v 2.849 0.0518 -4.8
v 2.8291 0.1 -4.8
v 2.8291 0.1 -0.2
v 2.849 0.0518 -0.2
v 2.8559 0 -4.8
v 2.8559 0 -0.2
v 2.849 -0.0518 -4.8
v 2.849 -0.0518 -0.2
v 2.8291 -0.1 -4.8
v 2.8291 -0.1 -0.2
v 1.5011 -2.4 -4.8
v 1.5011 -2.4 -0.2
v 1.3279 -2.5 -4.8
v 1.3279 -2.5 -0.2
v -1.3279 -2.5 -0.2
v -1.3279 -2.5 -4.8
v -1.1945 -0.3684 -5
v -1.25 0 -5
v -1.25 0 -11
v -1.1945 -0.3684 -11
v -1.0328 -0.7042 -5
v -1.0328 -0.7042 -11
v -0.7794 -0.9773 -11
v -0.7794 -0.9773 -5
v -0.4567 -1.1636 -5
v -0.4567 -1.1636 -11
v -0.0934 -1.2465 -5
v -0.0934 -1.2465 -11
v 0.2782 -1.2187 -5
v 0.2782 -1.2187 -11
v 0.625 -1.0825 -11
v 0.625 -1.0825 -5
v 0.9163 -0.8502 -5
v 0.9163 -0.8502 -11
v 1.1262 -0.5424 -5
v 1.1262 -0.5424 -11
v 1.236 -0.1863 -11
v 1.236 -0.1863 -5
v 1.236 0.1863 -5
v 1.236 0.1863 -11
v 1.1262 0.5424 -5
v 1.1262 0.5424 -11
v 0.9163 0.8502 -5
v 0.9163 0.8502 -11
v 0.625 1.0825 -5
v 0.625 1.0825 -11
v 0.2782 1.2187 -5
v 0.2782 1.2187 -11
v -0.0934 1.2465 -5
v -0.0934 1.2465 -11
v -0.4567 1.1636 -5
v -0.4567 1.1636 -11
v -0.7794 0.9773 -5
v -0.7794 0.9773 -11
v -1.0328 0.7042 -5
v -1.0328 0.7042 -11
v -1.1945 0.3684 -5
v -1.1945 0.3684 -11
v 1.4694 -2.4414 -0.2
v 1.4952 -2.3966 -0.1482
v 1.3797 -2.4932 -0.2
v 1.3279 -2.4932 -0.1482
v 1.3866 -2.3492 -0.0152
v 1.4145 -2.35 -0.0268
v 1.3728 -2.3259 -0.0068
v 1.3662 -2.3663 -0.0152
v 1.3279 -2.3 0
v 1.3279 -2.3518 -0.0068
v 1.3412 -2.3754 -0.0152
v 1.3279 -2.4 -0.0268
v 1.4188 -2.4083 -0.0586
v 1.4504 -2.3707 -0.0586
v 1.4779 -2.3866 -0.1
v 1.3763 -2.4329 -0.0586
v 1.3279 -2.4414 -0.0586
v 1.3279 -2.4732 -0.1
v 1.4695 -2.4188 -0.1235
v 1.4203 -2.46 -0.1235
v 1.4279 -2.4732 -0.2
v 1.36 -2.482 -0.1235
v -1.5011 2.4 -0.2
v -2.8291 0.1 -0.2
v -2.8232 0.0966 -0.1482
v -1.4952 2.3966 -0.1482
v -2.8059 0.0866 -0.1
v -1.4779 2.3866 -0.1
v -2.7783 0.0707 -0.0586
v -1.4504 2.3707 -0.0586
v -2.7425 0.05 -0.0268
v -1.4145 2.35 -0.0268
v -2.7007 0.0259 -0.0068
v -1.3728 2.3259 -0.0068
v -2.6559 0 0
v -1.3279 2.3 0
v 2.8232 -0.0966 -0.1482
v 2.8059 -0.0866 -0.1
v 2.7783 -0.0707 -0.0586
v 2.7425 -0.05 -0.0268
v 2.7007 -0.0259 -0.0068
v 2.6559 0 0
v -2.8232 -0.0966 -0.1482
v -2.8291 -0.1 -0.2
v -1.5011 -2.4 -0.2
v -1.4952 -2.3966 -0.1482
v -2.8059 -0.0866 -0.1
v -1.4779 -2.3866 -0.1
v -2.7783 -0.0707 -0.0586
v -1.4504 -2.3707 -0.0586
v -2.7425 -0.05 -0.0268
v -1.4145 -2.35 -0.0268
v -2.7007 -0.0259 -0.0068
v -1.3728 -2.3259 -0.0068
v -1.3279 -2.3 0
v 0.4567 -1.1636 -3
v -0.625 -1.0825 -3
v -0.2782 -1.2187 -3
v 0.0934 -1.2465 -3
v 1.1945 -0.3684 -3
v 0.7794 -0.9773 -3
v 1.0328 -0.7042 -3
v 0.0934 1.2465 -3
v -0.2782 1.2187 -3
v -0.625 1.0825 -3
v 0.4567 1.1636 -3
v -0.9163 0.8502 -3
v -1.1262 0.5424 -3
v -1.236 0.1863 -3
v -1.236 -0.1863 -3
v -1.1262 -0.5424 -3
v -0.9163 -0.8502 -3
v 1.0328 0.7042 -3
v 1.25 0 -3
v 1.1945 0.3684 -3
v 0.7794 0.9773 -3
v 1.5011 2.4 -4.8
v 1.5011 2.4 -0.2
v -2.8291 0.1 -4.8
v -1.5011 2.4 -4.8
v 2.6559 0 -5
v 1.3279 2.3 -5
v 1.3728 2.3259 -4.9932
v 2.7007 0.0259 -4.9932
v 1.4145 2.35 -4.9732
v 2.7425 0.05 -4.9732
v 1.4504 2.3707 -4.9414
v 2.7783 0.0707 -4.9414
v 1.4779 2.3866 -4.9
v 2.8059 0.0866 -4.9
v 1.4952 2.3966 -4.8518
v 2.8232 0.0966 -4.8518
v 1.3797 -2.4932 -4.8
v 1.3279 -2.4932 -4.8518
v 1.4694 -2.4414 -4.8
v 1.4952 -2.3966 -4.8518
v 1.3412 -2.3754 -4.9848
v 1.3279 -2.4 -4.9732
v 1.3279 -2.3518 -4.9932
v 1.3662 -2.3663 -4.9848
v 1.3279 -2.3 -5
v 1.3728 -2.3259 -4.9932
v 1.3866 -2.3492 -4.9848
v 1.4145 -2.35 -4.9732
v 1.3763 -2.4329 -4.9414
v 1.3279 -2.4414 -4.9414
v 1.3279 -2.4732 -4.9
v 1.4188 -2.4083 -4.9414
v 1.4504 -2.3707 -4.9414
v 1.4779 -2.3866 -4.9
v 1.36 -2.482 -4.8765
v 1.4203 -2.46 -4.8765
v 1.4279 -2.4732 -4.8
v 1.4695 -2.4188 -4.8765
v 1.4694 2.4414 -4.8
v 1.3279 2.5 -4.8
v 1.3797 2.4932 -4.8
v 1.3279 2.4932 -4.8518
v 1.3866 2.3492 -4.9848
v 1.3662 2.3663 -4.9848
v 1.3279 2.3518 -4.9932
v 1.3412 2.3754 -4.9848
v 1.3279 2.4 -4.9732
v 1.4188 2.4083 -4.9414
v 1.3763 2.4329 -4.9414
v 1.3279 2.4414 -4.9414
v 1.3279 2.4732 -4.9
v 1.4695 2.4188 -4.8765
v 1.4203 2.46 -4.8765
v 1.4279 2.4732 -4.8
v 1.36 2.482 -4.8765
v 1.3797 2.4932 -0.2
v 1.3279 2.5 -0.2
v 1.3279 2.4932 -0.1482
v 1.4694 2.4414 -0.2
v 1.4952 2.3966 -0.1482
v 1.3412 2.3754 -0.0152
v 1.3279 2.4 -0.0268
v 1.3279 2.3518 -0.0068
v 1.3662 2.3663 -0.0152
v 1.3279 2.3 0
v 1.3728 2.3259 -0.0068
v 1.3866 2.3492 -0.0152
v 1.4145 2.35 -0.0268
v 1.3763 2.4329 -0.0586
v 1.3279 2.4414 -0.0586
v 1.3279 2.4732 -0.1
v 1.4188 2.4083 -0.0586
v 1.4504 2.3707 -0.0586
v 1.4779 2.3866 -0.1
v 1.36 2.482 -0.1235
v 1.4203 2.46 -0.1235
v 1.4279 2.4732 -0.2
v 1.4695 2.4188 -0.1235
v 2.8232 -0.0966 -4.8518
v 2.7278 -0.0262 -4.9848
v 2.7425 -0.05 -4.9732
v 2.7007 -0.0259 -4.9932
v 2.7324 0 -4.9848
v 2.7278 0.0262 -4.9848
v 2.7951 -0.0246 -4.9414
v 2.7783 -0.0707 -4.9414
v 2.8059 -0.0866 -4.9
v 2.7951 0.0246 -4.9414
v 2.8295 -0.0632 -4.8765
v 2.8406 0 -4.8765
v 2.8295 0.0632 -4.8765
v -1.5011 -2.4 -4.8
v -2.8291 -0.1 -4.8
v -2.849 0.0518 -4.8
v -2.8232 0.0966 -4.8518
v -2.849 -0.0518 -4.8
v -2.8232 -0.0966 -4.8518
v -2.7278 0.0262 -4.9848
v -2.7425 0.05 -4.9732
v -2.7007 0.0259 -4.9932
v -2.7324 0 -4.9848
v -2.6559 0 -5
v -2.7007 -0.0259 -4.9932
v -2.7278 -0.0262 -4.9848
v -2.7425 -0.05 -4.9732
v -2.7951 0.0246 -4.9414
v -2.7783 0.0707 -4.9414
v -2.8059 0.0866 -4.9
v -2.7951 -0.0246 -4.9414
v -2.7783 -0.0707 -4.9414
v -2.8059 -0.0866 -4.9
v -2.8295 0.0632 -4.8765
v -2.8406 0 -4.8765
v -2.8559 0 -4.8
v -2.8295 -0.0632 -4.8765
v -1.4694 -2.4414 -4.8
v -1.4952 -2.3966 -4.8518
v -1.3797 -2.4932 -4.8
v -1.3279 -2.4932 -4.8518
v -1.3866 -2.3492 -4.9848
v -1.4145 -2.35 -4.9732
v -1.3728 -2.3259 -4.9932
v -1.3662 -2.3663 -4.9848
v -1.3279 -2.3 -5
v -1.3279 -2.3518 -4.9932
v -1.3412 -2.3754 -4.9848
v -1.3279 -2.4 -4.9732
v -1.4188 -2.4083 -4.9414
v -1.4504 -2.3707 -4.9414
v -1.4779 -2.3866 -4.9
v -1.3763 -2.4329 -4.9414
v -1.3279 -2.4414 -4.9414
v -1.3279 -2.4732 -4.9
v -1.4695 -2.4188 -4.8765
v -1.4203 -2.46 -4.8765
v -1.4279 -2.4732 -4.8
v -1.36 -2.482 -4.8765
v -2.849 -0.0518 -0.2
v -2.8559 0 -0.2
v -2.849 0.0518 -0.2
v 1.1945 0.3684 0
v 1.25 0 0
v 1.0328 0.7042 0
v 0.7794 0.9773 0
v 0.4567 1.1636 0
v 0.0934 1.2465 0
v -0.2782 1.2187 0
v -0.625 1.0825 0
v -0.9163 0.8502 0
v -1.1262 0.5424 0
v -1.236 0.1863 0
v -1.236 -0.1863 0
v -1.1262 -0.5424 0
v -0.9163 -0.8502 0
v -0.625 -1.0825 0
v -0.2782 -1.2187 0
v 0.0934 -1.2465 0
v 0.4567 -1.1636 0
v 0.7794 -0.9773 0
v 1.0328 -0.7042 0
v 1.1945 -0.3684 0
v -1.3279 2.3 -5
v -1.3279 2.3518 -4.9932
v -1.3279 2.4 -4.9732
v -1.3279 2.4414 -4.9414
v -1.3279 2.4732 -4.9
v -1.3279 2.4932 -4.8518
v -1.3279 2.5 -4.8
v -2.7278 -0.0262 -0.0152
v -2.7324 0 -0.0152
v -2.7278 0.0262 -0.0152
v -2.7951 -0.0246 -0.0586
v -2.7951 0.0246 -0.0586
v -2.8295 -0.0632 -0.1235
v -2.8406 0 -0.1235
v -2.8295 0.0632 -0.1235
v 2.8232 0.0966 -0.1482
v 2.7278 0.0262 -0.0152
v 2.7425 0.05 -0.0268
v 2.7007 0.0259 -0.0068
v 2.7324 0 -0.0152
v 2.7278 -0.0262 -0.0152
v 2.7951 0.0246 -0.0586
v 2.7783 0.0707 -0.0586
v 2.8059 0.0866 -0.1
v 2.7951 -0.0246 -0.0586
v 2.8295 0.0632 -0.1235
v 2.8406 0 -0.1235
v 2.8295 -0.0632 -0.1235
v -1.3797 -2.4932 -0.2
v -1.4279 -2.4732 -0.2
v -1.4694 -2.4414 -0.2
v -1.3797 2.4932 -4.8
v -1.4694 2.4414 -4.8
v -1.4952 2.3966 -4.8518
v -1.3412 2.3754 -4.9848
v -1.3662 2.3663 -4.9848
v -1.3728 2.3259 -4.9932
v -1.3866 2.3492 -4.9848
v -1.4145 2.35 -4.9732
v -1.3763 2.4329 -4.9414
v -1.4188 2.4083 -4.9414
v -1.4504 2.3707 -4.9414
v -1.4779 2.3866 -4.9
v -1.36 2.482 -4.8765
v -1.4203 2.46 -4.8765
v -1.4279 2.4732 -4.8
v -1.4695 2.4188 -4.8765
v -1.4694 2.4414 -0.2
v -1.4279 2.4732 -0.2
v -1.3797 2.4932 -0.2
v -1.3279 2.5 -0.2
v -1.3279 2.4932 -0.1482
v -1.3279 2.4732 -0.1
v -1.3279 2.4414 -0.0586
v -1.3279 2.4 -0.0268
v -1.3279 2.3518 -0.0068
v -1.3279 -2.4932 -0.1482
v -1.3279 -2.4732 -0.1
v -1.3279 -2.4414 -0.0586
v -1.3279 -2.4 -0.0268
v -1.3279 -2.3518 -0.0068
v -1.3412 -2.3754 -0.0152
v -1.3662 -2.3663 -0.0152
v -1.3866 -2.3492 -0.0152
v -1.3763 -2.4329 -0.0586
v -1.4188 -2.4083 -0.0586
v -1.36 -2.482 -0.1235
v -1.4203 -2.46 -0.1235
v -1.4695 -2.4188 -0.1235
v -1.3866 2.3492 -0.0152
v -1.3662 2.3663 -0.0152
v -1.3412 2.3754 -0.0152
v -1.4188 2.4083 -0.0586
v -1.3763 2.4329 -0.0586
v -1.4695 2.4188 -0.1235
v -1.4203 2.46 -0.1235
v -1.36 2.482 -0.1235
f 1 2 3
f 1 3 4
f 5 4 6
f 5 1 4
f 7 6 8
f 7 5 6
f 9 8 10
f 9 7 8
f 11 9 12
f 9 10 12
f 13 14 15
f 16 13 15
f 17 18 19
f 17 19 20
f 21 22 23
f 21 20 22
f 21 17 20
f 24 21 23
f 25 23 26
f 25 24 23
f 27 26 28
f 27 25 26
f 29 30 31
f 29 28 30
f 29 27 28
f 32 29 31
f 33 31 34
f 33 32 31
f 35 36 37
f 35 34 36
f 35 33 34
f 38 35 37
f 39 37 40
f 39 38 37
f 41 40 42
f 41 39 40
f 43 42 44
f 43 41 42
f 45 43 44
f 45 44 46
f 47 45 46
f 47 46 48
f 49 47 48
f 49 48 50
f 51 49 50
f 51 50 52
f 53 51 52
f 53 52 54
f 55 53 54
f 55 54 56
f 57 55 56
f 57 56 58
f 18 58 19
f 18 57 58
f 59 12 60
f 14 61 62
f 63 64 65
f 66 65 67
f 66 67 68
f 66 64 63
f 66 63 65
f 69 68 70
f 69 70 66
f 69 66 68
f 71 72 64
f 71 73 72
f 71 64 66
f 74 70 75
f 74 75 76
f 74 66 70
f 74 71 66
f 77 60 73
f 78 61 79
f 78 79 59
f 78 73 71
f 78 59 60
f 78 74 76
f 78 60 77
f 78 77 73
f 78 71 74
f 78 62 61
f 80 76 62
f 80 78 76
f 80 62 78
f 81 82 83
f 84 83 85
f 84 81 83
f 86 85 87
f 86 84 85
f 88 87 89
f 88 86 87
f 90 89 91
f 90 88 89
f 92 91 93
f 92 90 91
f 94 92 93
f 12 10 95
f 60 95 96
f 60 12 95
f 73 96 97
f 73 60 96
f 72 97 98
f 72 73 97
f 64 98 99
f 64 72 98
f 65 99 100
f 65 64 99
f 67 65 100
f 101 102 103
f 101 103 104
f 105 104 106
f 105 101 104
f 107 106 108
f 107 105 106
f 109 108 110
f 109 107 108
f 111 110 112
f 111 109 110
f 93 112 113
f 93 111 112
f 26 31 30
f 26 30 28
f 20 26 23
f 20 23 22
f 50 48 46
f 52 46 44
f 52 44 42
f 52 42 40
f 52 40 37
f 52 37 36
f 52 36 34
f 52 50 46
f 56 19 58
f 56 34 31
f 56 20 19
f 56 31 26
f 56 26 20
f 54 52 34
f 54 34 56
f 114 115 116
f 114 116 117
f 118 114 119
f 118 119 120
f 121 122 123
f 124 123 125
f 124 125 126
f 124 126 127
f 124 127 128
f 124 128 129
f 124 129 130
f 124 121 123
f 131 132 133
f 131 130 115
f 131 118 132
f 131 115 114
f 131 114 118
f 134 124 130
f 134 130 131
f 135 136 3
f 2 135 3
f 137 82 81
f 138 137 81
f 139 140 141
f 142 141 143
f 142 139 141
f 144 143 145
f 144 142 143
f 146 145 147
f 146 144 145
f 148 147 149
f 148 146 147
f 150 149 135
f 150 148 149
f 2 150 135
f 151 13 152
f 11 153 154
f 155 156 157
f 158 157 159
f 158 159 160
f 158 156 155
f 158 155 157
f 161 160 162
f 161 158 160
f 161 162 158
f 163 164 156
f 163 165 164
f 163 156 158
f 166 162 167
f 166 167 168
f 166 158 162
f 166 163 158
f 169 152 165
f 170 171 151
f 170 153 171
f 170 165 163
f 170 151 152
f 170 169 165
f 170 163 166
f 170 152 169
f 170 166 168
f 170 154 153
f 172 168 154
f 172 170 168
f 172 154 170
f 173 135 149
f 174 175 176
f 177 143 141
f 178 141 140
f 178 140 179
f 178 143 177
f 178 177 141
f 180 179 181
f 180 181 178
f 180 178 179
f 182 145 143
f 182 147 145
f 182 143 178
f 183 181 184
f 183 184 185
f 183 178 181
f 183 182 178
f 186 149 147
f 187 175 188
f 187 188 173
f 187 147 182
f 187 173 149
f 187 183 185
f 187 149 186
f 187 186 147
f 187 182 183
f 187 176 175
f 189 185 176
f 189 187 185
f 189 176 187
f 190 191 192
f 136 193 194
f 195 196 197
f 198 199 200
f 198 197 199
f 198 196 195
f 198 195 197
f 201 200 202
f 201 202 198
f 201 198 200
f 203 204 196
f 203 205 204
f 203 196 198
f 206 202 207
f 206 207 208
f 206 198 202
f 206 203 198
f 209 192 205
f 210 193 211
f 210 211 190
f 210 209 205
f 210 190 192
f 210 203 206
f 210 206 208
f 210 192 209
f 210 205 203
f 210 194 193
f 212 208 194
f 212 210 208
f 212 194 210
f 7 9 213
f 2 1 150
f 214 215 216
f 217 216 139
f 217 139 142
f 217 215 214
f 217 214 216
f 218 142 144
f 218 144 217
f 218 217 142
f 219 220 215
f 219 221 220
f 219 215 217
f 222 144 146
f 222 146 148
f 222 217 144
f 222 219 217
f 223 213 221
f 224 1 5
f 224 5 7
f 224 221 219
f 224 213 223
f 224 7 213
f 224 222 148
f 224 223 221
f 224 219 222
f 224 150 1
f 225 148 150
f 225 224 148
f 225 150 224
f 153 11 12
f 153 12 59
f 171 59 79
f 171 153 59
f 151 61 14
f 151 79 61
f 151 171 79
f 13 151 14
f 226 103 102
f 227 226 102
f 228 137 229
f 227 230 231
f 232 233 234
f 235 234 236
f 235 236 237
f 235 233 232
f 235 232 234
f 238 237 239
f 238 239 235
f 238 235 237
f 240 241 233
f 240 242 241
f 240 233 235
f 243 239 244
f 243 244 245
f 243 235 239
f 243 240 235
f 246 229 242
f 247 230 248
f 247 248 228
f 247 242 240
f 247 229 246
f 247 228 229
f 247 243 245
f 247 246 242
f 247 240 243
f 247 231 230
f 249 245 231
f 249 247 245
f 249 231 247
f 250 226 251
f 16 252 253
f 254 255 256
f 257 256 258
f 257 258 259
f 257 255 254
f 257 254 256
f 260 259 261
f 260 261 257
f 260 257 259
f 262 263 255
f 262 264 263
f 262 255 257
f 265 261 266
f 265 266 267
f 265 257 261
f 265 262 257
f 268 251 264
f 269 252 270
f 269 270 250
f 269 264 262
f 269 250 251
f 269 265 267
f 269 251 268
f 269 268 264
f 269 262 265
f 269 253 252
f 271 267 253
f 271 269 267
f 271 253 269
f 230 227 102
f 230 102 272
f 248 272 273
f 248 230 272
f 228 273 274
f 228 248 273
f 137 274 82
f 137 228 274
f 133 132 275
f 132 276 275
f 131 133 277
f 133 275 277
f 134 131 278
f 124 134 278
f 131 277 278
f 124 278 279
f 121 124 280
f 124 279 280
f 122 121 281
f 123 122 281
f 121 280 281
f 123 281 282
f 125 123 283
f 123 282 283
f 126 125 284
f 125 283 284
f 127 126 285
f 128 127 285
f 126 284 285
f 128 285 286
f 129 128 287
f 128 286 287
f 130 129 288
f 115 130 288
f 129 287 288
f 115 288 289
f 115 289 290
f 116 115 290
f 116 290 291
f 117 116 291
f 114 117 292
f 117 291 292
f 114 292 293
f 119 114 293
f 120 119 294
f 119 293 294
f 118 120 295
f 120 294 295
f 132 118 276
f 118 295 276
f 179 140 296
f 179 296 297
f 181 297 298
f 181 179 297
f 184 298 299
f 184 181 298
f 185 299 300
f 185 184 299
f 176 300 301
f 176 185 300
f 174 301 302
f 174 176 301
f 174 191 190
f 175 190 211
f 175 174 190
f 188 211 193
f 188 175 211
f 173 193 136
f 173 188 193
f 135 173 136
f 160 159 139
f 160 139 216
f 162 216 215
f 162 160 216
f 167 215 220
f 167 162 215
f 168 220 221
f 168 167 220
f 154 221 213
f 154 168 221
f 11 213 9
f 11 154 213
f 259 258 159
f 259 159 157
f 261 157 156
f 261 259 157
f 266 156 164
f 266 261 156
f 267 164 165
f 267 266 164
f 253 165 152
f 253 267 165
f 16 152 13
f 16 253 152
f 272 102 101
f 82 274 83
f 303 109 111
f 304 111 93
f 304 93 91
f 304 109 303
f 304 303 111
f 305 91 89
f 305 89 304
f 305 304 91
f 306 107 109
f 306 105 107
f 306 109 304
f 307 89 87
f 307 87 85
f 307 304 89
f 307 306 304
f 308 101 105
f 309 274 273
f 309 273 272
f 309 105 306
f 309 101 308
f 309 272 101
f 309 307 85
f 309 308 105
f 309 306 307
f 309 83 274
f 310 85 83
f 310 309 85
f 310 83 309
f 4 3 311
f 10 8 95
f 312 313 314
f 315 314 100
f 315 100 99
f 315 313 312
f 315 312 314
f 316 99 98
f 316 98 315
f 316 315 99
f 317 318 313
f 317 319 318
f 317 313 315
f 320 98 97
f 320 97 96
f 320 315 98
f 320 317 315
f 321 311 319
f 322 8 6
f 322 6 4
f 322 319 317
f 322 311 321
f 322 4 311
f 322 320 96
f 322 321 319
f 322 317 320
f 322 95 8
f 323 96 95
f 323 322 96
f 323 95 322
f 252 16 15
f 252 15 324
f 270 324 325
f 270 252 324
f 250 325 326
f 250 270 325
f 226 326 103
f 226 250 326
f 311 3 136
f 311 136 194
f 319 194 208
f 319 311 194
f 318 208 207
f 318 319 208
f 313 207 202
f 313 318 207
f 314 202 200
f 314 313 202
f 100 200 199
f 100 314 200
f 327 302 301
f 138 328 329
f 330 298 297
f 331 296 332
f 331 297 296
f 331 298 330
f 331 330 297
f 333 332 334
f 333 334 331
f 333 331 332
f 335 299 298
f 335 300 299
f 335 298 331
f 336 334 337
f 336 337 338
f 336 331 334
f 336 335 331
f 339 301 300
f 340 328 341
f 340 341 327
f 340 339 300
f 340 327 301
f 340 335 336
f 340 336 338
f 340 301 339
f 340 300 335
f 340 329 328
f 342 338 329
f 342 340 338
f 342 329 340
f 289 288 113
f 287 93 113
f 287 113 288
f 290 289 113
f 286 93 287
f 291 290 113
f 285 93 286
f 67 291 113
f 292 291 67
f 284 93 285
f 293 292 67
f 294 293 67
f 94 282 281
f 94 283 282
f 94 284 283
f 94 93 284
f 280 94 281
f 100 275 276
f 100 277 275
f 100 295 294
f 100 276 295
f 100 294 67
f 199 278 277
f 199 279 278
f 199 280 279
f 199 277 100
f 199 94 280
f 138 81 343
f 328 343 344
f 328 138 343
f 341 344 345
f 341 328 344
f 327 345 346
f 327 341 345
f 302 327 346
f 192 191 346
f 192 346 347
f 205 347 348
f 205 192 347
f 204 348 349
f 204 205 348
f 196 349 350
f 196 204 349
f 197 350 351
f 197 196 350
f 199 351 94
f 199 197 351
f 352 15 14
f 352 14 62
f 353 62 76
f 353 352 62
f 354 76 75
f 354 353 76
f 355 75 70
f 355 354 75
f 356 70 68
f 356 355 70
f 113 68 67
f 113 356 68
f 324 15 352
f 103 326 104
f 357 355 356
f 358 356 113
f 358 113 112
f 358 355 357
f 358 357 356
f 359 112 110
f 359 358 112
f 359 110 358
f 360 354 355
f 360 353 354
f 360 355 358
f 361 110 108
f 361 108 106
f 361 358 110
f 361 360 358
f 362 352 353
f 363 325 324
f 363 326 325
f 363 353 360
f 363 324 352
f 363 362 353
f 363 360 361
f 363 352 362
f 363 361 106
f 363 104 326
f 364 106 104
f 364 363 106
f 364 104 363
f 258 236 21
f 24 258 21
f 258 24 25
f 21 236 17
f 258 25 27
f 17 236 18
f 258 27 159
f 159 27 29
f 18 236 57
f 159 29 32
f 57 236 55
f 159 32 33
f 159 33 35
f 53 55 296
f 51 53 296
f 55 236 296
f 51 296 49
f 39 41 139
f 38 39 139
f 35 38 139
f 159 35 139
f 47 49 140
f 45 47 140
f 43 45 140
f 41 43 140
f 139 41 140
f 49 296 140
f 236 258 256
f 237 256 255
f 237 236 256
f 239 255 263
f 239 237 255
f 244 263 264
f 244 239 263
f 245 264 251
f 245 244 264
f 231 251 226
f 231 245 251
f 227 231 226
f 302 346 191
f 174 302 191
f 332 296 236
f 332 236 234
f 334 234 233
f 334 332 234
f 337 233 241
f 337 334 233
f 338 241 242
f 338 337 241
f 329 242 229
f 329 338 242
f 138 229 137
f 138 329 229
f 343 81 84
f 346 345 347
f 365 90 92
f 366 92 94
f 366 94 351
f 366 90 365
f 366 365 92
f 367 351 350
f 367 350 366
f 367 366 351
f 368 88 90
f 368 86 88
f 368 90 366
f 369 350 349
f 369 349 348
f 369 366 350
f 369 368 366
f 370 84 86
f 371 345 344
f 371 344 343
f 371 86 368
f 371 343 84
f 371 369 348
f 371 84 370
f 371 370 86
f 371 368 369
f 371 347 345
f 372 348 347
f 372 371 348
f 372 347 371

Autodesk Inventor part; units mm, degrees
ref_plane "YZ Plane" through (0, 0, 0) normal (1, 0, 0) x (0, 1, 0)
ref_plane "XZ Plane" through (0, 0, 0) normal (0, 1, 0) x (-1, 0, 0)
ref_plane "XY Plane" through (0, 0, 0) normal (0, 0, 1) x (1, 0, 0)
sketch "Sketch1" plane through (0, 0, 0) normal (0, 0, 1) x (1, 0, 0)
  line L0 (1.4434, -2.5) -> (-1.4434, -2.5)
  line L1 (-1.4434, -2.5) -> (-2.8868, 0)
  line L2 (-2.8868, 0) -> (-1.4434, 2.5)
  line L3 (-1.4434, 2.5) -> (1.4434, 2.5)
  line L4 (1.4434, 2.5) -> (2.8868, 0)
  line L5 (2.8868, 0) -> (1.4434, -2.5)
  point P0 (0, 0)
  point P1 (0, 0)
  dimension "d0" = 5
extrude "Extrusion1" add sketch "Sketch1" against normal blind 5
sketch "Sketch2" plane through (0, 0, 0) normal (0, 0, 1) x (1, 0, 0)
  circle A0 centre (0, 0) radius 1.25
  dimension "d3" = 2.5
extrude "Extrusion2" cut sketch "Sketch2" against normal blind 3
sketch "Sketch3" plane through (0, 0, -5) normal (0, 0, -1) x (-1, 0, 0)
  circle A0 centre (0, 0) radius 1.25
  dimension "d6" = 2.5
extrude "Extrusion3" add sketch "Sketch3" along normal blind 6
thread "Thread1" size "M2.5x0.45" class "6g" standard "ISO Metric profile" full length
thread "Thread2" size "M2.5x0.45" class "6H" standard "ISO Metric profile" full length
fillet "Fillet1" radius 0.2 12 edges at (0, -2.5, -5) (-2.1651, -1.25, -5) (-2.1651, 1.25, -5) (0, 2.5, -5) (2.1651, 1.25, -5) (2.1651, -1.25, -5) (0, -2.5, 0) (2.1651, -1.25, 0) (2.1651, 1.25, 0) (0, 2.5, 0) (-2.1651, 1.25, 0) (-2.1651, -1.25, 0)
fillet "Fillet1" radius 0.2 6 edges at (-2.8868, 0, -2.5) (-1.4434, 2.5, -2.5) (1.4434, 2.5, -2.5) (2.8868, 0, -2.5) (1.4434, -2.5, -2.5) (-1.4434, -2.5, -2.5)
equation "\"d0\" = m3hs_hexDiam"
equation "\"d1\" = m3hs_bodyLength"
equation "\"d3\" = m3hs_threadDiam"
equation "\"d4\" = m3hs_holeDepth"
equation "\"d6\" = m3hs_threadDiam"
equation "\"d7\" = m3hs_studLength"
equation "\"d13\" = m3hs_rounding"
equation "\"m3hs_hexDiam\" = 5"
equation "\"m3hs_bodyLength\" = 5"
equation "\"m3hs_holeDepth\" = 3"
equation "\"m3hs_studLength\" = 6"
equation "\"m3hs_rounding\" = 0.2"
equation "\"m3hs_threadDiam\" = 2.5"
properties part number "M2.5 Hex Spacer 5mm" material "Stainless Steel"
